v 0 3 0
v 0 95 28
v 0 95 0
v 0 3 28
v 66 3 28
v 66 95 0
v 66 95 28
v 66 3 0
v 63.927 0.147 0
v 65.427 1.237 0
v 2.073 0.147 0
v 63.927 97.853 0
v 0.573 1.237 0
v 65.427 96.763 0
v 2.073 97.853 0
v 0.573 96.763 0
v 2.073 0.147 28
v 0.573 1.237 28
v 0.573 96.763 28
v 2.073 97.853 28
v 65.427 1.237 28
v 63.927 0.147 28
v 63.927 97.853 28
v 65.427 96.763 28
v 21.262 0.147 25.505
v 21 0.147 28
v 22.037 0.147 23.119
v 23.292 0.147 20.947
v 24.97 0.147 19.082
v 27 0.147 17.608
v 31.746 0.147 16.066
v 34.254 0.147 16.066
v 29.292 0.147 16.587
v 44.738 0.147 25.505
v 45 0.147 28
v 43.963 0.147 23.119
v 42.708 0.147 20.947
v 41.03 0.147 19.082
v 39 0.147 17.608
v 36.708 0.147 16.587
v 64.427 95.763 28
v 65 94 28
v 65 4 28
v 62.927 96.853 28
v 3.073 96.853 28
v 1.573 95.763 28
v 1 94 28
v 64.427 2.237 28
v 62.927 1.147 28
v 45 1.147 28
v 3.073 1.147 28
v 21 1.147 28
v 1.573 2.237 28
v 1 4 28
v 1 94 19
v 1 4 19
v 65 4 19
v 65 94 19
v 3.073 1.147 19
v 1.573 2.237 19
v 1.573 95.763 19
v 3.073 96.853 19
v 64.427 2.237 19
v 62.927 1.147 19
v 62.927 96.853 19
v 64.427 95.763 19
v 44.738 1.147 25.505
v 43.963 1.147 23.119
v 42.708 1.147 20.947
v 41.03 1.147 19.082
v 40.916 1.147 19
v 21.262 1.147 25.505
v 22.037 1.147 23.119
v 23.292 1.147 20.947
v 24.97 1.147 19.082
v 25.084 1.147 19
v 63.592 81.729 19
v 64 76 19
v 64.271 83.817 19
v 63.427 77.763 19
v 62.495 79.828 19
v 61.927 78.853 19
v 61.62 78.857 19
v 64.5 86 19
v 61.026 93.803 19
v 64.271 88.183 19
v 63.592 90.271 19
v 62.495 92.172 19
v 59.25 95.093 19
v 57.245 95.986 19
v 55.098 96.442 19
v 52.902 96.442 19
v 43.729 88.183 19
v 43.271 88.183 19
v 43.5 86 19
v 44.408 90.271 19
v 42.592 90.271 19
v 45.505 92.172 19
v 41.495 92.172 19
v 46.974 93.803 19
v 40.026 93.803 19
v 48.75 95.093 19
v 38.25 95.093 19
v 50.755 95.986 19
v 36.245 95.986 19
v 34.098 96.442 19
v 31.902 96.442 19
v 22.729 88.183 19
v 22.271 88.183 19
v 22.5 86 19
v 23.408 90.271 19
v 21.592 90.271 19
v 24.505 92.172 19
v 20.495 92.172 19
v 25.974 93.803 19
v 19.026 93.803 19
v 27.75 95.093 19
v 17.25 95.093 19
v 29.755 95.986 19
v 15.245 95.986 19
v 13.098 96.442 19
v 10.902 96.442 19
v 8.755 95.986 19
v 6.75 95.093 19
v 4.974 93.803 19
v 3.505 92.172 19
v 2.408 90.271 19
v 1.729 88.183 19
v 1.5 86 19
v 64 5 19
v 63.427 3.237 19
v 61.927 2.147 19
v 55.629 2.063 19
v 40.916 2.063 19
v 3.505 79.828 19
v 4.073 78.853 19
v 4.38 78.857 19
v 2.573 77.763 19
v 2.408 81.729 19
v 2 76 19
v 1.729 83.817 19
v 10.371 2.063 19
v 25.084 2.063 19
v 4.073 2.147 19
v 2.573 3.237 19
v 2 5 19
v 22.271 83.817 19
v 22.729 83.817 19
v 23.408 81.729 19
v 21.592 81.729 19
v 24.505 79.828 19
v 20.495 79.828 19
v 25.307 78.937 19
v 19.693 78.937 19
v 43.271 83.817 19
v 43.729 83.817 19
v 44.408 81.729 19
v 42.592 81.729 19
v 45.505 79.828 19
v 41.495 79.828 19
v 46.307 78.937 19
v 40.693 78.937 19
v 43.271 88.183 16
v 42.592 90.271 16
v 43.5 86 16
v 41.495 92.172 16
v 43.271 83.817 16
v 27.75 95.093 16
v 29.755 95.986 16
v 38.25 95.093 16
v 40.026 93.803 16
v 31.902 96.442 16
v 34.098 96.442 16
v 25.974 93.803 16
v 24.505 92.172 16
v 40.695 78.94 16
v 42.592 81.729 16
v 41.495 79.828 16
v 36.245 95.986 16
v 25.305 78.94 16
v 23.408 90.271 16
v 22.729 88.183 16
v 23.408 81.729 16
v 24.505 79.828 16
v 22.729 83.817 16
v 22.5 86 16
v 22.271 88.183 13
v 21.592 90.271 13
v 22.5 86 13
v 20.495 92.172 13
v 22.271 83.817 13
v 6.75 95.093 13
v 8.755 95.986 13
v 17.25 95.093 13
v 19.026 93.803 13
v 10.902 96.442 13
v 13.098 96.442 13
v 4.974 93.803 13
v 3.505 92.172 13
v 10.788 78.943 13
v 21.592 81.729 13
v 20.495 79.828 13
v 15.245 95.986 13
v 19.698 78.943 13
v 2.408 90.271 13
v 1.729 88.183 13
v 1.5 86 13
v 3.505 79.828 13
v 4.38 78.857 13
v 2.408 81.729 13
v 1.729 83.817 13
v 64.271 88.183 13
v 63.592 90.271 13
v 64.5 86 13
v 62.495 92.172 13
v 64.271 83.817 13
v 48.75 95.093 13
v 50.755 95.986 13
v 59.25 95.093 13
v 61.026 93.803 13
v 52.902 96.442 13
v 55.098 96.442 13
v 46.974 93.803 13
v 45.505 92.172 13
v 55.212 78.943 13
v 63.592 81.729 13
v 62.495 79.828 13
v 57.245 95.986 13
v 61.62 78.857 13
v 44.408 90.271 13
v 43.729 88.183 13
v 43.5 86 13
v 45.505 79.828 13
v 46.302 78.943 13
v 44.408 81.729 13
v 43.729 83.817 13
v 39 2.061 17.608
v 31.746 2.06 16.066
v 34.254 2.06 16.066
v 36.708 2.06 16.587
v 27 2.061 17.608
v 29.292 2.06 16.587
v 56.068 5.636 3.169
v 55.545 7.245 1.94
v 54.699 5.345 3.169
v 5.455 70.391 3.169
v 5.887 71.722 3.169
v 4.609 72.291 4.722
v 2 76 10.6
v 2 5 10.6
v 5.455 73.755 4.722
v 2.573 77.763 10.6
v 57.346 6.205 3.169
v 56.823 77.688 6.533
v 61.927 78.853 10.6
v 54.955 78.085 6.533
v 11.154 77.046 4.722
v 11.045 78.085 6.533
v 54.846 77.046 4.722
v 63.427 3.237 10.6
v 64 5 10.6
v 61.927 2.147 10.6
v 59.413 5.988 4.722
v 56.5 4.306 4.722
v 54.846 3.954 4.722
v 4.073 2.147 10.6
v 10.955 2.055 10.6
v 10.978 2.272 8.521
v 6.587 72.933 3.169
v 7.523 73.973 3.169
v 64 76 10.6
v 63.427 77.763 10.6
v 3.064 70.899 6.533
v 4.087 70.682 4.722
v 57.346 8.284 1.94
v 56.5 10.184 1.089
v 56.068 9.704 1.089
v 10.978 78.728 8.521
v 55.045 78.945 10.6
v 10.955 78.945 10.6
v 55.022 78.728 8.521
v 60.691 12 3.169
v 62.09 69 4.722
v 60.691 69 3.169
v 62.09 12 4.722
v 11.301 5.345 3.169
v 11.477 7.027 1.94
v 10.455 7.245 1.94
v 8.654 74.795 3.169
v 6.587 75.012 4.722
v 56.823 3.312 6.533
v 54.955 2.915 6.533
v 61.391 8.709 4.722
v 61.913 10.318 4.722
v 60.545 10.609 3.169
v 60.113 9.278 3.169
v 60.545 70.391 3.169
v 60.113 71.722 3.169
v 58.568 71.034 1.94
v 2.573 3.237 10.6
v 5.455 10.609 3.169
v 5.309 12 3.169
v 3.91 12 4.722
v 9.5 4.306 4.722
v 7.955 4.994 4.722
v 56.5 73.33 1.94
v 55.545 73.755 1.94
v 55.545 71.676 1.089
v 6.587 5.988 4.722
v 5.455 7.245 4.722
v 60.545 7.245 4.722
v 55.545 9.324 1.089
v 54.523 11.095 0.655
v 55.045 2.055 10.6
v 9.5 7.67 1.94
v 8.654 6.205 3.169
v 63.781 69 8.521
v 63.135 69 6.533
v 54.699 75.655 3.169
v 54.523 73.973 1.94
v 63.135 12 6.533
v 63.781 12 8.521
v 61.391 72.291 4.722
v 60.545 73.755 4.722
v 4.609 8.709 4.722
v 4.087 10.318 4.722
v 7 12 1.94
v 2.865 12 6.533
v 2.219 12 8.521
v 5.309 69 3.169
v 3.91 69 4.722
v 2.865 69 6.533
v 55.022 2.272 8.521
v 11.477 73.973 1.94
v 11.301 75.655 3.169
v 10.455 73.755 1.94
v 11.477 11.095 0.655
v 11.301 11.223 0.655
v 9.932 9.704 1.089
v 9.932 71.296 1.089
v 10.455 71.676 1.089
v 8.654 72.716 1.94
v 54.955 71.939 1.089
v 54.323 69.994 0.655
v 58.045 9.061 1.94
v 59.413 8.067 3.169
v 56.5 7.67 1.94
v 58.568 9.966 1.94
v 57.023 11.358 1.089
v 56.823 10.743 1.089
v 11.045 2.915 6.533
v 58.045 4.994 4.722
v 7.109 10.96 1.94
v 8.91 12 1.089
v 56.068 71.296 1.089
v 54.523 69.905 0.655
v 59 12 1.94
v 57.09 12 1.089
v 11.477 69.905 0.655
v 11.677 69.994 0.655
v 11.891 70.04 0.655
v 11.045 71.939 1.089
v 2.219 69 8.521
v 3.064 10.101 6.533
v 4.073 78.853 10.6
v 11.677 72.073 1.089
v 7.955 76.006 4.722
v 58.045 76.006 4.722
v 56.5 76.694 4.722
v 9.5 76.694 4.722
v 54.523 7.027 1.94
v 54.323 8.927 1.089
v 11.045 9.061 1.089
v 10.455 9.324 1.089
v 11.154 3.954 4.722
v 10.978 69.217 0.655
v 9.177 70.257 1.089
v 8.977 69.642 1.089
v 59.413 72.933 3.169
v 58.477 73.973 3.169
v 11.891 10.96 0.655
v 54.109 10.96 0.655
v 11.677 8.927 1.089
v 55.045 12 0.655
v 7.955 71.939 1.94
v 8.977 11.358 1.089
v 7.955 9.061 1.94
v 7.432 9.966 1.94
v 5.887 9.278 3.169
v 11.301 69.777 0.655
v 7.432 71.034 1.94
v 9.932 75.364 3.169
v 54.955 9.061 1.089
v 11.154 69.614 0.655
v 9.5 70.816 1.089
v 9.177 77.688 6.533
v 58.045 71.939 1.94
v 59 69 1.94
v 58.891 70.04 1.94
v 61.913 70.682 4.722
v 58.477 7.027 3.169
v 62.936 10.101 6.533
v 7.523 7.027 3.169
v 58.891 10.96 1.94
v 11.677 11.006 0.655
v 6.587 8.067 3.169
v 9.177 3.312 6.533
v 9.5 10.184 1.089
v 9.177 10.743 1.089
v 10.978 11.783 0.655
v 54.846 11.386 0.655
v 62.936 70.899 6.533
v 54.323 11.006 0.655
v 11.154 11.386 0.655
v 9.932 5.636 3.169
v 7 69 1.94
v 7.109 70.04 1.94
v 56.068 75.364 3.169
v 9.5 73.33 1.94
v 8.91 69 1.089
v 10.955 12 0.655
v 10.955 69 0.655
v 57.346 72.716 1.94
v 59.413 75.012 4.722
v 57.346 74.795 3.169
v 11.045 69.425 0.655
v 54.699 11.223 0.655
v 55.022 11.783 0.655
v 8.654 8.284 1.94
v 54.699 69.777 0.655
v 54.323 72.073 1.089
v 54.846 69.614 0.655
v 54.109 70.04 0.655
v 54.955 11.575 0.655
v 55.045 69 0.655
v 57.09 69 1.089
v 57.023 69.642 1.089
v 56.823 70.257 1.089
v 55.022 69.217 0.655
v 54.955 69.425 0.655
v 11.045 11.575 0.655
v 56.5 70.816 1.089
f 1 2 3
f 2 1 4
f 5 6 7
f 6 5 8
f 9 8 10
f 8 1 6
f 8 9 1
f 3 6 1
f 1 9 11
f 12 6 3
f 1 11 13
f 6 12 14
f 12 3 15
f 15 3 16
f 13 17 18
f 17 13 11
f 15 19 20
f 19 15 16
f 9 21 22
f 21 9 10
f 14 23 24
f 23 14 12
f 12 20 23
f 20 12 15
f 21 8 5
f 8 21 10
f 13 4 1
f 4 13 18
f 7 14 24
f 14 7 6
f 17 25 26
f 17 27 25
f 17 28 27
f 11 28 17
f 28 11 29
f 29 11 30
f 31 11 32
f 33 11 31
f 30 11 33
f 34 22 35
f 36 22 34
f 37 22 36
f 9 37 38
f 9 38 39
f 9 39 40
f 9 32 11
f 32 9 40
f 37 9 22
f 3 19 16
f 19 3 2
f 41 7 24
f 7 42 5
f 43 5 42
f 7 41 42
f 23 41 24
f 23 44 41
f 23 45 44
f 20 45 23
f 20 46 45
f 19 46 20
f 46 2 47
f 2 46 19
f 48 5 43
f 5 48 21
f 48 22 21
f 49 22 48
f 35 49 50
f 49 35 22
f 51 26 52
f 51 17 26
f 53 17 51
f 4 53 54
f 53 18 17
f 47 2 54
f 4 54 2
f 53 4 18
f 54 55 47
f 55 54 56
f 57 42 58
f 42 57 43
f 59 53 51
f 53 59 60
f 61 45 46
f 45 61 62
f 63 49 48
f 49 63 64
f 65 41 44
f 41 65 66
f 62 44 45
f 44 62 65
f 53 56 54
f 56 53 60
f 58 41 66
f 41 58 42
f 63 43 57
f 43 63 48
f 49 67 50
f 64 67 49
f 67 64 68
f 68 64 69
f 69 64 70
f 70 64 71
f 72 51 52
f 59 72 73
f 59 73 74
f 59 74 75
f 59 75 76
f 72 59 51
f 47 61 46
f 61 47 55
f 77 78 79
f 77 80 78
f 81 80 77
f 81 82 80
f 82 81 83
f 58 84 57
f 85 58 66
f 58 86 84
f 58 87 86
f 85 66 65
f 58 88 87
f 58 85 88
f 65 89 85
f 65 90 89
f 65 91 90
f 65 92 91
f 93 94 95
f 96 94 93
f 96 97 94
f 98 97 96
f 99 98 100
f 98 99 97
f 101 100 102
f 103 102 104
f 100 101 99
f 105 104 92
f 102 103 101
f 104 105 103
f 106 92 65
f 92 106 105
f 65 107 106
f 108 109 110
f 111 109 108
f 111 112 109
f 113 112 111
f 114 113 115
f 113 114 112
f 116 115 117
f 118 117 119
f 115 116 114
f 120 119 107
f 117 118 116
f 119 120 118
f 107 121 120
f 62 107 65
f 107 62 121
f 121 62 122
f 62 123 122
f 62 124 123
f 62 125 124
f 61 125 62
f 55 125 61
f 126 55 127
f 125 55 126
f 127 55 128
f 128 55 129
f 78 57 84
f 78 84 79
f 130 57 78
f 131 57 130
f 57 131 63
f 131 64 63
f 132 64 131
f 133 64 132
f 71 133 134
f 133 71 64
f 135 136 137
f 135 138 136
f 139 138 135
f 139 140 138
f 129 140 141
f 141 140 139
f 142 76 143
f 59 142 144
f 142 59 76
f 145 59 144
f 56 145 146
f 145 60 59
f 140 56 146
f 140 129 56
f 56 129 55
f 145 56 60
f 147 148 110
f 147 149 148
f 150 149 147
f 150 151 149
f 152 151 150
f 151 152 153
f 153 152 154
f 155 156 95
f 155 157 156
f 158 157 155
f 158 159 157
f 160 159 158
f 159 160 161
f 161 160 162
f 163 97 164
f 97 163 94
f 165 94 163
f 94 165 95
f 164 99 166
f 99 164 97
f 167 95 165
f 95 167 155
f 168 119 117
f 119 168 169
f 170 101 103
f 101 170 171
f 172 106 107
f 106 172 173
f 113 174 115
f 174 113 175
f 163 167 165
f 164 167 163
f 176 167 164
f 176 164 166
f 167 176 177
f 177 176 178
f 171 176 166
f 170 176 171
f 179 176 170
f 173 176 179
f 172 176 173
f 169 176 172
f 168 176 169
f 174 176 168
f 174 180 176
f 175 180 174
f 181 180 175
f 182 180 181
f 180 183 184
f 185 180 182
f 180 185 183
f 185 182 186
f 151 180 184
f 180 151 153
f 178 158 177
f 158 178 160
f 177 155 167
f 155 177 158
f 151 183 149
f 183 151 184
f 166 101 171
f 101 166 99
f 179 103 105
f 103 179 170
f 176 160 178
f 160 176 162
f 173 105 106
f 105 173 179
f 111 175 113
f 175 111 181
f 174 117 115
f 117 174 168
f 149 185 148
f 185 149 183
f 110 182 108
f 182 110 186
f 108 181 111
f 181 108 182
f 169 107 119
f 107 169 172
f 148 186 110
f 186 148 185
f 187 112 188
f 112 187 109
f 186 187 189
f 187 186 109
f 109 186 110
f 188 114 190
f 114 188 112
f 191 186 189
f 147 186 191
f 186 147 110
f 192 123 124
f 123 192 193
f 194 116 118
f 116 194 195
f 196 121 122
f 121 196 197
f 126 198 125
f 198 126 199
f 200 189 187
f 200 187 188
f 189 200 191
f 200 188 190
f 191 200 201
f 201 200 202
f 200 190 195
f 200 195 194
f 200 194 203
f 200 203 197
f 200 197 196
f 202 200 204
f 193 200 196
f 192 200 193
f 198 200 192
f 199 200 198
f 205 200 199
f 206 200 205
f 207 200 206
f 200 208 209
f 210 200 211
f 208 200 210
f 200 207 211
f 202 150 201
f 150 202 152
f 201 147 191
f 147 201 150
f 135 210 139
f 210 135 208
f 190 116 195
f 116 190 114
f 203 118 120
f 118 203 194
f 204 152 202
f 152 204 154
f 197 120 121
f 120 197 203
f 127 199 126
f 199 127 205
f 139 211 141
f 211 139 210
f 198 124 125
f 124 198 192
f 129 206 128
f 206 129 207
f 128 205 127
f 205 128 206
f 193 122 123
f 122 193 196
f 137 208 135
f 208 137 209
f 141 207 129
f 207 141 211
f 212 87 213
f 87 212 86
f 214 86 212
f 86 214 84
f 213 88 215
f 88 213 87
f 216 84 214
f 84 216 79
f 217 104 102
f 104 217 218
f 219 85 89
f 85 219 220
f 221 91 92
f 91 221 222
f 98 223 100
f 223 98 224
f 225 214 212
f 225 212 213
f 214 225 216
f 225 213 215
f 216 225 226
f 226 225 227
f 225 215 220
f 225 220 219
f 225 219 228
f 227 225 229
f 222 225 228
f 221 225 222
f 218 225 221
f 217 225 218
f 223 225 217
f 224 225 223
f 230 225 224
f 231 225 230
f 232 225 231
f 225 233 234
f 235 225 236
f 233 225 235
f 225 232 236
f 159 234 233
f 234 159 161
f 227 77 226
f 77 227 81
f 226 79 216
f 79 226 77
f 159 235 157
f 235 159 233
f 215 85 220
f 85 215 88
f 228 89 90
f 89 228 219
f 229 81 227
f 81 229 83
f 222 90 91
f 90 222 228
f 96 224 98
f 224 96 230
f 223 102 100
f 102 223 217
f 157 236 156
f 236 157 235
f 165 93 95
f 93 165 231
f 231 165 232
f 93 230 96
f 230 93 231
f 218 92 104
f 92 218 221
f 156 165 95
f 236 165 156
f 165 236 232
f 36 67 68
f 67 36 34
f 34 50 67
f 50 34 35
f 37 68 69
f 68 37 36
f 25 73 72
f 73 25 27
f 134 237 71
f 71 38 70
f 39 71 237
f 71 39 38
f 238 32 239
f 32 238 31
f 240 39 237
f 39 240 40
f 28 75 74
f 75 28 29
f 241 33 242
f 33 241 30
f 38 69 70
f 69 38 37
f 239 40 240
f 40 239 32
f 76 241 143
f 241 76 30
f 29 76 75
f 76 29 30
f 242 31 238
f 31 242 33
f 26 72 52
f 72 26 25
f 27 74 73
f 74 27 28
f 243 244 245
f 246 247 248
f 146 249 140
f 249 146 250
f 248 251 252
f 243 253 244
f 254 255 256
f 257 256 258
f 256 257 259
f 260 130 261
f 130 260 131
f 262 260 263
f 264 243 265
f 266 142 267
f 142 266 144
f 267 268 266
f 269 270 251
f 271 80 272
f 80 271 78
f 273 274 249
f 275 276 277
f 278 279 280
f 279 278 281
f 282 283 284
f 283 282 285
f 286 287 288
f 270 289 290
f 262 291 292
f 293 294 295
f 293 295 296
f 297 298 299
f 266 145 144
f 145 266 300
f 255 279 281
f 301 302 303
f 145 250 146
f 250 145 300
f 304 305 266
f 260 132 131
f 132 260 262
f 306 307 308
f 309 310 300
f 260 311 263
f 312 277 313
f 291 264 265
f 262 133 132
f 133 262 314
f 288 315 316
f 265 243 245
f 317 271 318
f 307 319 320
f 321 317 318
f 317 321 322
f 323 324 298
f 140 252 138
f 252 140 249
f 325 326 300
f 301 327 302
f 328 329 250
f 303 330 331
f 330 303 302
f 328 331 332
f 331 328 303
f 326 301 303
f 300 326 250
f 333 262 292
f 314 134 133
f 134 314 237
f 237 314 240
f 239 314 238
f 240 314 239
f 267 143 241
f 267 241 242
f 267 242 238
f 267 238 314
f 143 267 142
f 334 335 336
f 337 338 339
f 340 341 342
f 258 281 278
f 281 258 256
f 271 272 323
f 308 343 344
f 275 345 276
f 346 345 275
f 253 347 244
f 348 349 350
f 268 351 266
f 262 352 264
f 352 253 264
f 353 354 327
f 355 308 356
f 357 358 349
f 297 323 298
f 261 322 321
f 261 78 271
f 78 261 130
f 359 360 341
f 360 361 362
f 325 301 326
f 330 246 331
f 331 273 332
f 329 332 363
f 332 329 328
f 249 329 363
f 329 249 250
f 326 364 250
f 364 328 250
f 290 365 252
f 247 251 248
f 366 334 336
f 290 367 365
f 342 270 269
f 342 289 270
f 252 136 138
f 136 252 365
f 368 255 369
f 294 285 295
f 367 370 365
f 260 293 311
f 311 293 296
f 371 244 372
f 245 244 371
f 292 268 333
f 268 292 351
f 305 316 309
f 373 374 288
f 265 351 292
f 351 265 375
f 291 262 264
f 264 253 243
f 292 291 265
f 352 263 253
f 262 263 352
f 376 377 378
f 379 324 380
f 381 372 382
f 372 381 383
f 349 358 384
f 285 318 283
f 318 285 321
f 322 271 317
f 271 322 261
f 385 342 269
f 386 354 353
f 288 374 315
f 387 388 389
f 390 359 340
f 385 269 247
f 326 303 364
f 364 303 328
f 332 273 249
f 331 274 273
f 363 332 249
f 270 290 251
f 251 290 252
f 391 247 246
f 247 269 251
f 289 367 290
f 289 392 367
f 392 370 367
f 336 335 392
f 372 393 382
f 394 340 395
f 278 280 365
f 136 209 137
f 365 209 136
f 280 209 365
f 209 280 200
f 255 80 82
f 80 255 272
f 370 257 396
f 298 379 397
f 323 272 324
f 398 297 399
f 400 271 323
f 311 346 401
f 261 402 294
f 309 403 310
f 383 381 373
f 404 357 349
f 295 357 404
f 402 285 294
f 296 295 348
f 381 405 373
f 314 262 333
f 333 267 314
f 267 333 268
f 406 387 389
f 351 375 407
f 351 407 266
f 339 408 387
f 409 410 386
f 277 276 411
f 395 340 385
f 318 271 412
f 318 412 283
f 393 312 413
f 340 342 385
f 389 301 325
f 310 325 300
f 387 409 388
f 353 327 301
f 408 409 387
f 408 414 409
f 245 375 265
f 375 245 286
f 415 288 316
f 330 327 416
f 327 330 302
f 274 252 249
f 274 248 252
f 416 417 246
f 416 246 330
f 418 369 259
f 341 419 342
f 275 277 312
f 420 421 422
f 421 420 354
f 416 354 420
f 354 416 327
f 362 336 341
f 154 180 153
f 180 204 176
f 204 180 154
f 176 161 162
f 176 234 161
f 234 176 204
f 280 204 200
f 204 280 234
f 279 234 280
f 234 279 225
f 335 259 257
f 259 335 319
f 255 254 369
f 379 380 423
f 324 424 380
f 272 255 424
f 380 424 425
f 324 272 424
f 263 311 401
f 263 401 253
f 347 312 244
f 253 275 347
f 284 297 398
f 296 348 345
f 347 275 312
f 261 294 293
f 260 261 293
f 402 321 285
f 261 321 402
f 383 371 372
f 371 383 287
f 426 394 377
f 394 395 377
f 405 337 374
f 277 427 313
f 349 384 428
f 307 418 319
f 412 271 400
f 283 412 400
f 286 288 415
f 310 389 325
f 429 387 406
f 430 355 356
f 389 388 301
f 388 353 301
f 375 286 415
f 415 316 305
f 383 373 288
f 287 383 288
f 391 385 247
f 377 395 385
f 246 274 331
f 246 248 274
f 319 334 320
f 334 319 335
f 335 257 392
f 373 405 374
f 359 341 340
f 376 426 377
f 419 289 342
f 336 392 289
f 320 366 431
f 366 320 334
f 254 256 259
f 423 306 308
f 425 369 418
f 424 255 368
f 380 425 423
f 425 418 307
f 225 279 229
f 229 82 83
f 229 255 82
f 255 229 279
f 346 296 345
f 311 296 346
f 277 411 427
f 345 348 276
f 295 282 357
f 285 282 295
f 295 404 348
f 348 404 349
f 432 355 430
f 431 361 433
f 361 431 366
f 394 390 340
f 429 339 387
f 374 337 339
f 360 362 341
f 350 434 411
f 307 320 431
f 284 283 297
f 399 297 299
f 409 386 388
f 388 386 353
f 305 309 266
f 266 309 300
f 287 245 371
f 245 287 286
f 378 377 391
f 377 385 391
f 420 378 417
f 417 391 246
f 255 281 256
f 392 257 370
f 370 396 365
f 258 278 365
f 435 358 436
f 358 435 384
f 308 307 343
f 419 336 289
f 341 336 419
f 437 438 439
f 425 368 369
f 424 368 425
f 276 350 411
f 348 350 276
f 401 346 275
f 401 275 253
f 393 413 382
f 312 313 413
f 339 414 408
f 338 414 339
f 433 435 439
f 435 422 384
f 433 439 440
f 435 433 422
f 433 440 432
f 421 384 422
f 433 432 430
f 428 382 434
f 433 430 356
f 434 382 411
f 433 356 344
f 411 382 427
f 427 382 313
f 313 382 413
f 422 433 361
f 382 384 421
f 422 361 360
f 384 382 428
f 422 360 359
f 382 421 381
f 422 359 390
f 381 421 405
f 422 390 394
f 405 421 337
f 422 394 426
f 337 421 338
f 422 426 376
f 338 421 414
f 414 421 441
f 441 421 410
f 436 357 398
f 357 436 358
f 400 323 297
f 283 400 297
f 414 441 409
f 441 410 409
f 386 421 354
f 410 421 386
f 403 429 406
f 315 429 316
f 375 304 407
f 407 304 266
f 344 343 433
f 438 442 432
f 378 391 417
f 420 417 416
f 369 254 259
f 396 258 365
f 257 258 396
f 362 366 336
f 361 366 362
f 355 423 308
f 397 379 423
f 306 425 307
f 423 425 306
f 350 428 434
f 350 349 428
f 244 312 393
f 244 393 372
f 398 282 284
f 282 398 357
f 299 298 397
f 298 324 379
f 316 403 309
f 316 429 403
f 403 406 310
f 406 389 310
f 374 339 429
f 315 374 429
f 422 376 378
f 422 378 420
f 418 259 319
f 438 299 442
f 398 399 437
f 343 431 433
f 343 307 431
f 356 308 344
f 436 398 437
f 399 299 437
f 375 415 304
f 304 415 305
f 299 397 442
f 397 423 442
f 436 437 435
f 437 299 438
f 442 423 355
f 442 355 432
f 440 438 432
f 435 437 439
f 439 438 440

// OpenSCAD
/* rotate([160,0,0]) { rotate([20,0,0]) difference() {
    cube([11,14,2]);
    for (i=[0:2]) for (j=[0:3]) translate([i*3.2+1.2,j*3.2+1.2,1.4]) cube([2.2,2.2,99]);
 }
translate([1.5,0,0]) rotate([90,0,90]) linear_extrude(8) polygon([[2,0], [2,1], [11,4], [11,0] ]);
 } */
 
 module roundedCube(vec) {
     r=3;
     hull() {
         translate([r,r,0]) cylinder(r=r,h=vec.z);
         translate([vec.x-r,r,0]) cylinder(r=r,h=vec.z);
         translate([r,vec.y-r,0]) cylinder(r=r,h=vec.z);
         translate([vec.x-r,vec.y-r,0]) cylinder(r=r,h=vec.z); 
     }
 } 
 
 module well(x,y,w,h) {
     translate([x,y,0.6]) {
        hull() {
            r=10;
            translate([r,r,r]) sphere(r);
            translate([w-r,r,r]) sphere(r);
            translate([r,h-r,r]) sphere(r);
            translate([w-r,h-r,r]) sphere(r);
            translate([0,0,r]) roundedCube([w,h,99]);
        }
     }
 }
 
 module astronautTray() {
     difference() {
         roundedCube([82,89,28]);
         translate([1,1,0.6]) roundedCube([26,87,99]);
         translate([28,1,0.6]) cube([26,87,99]);
         translate([55,1,0.6]) cube([26,87,99]);
     }
}
 
// astronautTray();
 
 module resourceTray() {
     difference() {
         roundedCube([82,89,28]);
         well(1,1,26,52);
         well(28,1,26,52);
         well(55,1,26,52);
         well(1,54,30,33);
         well(32,54,49,33);
         //translate([1,1,28-10.6]) roundedCube([80,52,99]);
     }
 }
 
// resourceTray();
 
module innerTray(which) {
    module radar(cx,cy,rot) {
        translate([cx,cy,19-13]) rotate([0,0,rot]) translate([25,-13/2,0]) cube([8,13,13]);
    }
    module rc(x,y,w,h) {
        translate([x,y,0.6]) roundedCube([w,h,99]);
    }
    difference() {
         roundedCube([66,98,28]);
         translate([1,1,19]) roundedCube([64,96,99]);
         translate([33,98-12,which == 3? 13 : 16]) cylinder(d=21,h=99);
         translate([33-21,98-12,13]) cylinder(d=21,h=99);
         translate([33+21,98-12,13]) cylinder(d=21,h=99);
         translate([33,0,28]) rotate([-90,0,0]) cylinder(d=24,h=4);
         if (which == 3) {
            well(2,2,62,25);
            well(2,28,62,25);
            well(2,54,62,25);
         }
         else if (which == 2) {
            well(2,2,62,44);
            well(2,47,62,77-44-1);
         }
         else if (which == 2.5) {
            rc(2,2,62,45);
            well(2,48,62,77-45-1);
         }
         else if (which == 1) {
            well(2,2,62,77);
         }
         else if (which == 6) {
             cx = 33; cy = 27;
             translate([cx,cy,0.6]) cylinder(h=99,d=60,$fn=6);
             translate([cx,cy,-1]) cylinder(h=99,d=40,$fn=6);
             well(2,54,62,25);
             radar(cx,cy,30);
             radar(cx,cy,180-30);
             radar(cx,cy,360-30);
             radar(cx,cy,180+30);
             /*translate([2,2,12]) roundedCube([13,13,7]);
             translate([66-15,2,12]) roundedCube([13,13,7]);
             translate([2,40,12]) roundedCube([13,13,7]);
             translate([66-15,40,12]) roundedCube([13,13,7]); */
         }
     }
 }
 
 innerTray(1);
//innerTray(2.5); // Moon Mining, To Mars, Space Robotics
// innerTray(6); // SkyWatch
